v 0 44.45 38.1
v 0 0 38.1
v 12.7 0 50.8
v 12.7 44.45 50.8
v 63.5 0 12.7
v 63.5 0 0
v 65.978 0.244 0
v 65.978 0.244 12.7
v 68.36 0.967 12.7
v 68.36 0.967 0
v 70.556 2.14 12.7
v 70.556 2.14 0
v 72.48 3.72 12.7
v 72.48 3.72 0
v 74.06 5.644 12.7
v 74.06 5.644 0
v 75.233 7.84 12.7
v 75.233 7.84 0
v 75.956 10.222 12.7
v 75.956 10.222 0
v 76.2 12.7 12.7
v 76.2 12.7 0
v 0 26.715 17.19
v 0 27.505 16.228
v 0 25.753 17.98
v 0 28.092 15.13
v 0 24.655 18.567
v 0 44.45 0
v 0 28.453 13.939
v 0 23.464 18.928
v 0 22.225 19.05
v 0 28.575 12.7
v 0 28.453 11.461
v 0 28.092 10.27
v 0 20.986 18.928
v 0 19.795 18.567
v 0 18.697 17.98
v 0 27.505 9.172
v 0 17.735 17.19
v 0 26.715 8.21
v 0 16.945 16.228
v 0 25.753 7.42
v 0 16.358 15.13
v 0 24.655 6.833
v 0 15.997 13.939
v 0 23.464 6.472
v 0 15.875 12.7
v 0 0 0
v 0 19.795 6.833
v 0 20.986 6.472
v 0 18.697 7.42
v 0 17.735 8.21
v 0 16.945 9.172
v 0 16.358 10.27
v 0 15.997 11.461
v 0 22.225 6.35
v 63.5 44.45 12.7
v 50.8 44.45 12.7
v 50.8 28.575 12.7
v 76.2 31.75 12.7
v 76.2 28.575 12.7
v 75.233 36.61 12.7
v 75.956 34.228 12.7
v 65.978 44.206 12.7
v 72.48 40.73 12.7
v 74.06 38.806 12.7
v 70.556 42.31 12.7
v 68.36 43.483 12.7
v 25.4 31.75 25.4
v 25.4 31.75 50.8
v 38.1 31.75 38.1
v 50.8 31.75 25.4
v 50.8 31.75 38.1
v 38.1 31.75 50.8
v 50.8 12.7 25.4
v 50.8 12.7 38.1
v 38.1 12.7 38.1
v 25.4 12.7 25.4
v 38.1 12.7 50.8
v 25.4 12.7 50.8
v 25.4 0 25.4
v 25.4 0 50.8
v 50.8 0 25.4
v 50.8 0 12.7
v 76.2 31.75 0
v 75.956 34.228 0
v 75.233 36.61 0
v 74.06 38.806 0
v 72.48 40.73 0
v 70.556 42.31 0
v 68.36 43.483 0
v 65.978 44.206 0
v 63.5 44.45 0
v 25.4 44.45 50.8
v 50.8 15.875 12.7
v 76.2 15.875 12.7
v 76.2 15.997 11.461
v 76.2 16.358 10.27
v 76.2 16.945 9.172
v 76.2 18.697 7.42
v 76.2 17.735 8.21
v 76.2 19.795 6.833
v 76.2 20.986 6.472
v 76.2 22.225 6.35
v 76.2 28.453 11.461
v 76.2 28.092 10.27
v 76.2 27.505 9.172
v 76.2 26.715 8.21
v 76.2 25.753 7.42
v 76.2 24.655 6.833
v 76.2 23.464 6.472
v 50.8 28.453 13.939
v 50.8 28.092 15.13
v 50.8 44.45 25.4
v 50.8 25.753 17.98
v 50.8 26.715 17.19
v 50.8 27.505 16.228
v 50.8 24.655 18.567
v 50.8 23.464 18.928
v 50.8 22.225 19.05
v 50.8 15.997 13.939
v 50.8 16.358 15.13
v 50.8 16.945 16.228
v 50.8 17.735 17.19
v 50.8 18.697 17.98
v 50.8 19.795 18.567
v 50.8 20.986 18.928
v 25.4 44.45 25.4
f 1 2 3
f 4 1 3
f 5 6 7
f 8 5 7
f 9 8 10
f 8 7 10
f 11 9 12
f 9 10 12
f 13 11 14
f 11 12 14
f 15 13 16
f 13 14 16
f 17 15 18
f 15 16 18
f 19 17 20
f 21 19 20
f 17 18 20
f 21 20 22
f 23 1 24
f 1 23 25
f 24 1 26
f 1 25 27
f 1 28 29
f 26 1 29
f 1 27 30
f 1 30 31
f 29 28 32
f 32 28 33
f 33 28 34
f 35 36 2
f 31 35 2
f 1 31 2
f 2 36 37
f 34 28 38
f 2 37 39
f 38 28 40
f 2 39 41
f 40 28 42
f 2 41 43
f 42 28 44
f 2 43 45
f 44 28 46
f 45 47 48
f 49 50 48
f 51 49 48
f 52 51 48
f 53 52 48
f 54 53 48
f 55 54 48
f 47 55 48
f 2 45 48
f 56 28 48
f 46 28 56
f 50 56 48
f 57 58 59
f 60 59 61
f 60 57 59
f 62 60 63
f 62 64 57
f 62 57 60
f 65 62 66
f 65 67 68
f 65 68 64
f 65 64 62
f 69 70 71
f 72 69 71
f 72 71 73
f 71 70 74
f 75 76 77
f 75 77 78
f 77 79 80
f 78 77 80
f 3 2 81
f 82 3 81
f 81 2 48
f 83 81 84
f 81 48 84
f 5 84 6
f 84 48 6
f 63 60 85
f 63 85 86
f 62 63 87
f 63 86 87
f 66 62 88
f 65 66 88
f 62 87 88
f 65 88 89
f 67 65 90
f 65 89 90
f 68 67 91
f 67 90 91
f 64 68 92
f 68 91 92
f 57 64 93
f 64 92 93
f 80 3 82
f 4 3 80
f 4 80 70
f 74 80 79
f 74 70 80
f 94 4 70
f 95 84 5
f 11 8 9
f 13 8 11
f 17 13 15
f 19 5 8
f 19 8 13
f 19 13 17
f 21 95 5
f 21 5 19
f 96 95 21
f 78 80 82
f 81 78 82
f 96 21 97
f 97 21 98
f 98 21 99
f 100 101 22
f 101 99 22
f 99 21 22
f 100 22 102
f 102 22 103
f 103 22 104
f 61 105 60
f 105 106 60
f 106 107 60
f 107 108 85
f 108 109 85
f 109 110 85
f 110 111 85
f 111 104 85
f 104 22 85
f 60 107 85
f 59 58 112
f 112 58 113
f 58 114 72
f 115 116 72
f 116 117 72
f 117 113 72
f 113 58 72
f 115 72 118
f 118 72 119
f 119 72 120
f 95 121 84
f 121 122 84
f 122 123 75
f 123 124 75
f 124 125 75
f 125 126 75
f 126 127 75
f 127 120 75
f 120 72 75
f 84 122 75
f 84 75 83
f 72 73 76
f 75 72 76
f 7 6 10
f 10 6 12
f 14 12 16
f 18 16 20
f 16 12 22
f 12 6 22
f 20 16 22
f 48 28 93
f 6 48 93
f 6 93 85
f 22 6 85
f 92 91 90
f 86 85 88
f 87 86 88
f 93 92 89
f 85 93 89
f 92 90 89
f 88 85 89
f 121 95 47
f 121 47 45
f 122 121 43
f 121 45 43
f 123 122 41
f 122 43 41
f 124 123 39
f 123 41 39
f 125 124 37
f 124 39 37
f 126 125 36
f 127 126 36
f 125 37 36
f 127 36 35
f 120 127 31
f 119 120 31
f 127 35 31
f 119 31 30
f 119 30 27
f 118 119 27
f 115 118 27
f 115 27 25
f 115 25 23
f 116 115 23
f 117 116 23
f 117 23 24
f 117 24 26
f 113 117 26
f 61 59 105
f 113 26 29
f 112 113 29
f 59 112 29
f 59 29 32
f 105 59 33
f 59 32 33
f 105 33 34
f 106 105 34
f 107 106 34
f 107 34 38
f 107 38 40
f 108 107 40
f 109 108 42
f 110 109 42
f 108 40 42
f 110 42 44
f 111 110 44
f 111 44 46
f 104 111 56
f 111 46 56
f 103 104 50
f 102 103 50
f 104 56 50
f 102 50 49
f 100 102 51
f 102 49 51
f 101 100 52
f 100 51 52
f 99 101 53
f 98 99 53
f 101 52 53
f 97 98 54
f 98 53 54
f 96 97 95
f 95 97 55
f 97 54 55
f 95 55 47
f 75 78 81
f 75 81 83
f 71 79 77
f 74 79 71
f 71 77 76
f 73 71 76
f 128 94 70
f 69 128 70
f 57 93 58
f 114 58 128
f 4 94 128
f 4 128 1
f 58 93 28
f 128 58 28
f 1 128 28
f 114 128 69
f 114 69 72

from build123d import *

# Parameters (mm, degrees)
F1_DEPTH = 50.8
F3_DEPTH = 25.4
F4_DEPTH = 38.1
F2_W     = 12.7
F2_H     = 19.05
F5_DEPTH = 12.7
F7_DEPTH = 44.45
F8_R     = 6.35
F9_DEPTH = 76.2


with BuildPart() as f1:
    # F0 (on Top) → F1 (new body)
    with BuildSketch(Plane.XY):
        with BuildLine():
            Line((0, 44.45), (0, 0))
            Line((0, 0), (63.5, 0))
            ThreePointArc((63.5, 0), (72.480256, 3.719744), (76.2, 12.7))
            Line((76.2, 12.7), (76.2, 31.75))
            ThreePointArc((76.2, 31.75), (72.480256, 40.730256), (63.5, 44.45))
            Line((63.5, 44.45), (0, 44.45))
        make_face()
    extrude(amount=F1_DEPTH)

    # F2 (on face) → F3 (cut)
    with BuildSketch(Plane.XY.offset(50.8)):
        Polygon((50.8, 44.45), (25.4, 44.45), (25.4, 31.75), (38.1, 31.75), (50.8, 31.75), align=None)
        Polygon((50.8, 0), (50.8, 12.7), (38.1, 12.7), (25.4, 12.7), (25.4, 0), align=None)
    extrude(amount=-F3_DEPTH, mode=Mode.SUBTRACT)

    # F2 (on face) → F4 (cut)
    with BuildSketch(Plane.XY.offset(50.8)):
        with BuildLine():
            Line((63.5, 44.45), (50.8, 44.45))
            Line((50.8, 44.45), (50.8, 31.75))
            Line((50.8, 31.75), (50.8, 12.7))
            Line((50.8, 12.7), (50.8, 0))
            Line((50.8, 0), (63.5, 0))
            ThreePointArc((63.5, 0), (72.480256, 3.719744), (76.2, 12.7))
            Line((76.2, 12.7), (76.2, 31.75))
            ThreePointArc((76.2, 31.75), (72.480256, 40.730256), (63.5, 44.45))
        make_face()
    extrude(amount=-F4_DEPTH, mode=Mode.SUBTRACT)

    # F2 (on face) → F5 (cut)
    with BuildSketch(Plane.XY.offset(50.8)):
        with Locations((44.45, 22.225)):
            Rectangle(F2_W, F2_H)
    extrude(amount=-F5_DEPTH, mode=Mode.SUBTRACT)

    # F6 (on face) → F7 (cut, through all)
    with BuildSketch(Plane.XZ):
        Polygon((0, 50.8), (0, 38.1), (12.7, 50.8), align=None)
    extrude(amount=-F7_DEPTH, mode=Mode.SUBTRACT)

    # F8 (on face) → F9 (cut, through all)
    with BuildSketch(Plane(origin=(0, 0, 0), x_dir=(0, -1, 0), z_dir=(-1, 0, 0))):
        with Locations((-22.225, 12.7)):
            Circle(F8_R)
    extrude(amount=-F9_DEPTH, mode=Mode.SUBTRACT)


solid = f1.part
